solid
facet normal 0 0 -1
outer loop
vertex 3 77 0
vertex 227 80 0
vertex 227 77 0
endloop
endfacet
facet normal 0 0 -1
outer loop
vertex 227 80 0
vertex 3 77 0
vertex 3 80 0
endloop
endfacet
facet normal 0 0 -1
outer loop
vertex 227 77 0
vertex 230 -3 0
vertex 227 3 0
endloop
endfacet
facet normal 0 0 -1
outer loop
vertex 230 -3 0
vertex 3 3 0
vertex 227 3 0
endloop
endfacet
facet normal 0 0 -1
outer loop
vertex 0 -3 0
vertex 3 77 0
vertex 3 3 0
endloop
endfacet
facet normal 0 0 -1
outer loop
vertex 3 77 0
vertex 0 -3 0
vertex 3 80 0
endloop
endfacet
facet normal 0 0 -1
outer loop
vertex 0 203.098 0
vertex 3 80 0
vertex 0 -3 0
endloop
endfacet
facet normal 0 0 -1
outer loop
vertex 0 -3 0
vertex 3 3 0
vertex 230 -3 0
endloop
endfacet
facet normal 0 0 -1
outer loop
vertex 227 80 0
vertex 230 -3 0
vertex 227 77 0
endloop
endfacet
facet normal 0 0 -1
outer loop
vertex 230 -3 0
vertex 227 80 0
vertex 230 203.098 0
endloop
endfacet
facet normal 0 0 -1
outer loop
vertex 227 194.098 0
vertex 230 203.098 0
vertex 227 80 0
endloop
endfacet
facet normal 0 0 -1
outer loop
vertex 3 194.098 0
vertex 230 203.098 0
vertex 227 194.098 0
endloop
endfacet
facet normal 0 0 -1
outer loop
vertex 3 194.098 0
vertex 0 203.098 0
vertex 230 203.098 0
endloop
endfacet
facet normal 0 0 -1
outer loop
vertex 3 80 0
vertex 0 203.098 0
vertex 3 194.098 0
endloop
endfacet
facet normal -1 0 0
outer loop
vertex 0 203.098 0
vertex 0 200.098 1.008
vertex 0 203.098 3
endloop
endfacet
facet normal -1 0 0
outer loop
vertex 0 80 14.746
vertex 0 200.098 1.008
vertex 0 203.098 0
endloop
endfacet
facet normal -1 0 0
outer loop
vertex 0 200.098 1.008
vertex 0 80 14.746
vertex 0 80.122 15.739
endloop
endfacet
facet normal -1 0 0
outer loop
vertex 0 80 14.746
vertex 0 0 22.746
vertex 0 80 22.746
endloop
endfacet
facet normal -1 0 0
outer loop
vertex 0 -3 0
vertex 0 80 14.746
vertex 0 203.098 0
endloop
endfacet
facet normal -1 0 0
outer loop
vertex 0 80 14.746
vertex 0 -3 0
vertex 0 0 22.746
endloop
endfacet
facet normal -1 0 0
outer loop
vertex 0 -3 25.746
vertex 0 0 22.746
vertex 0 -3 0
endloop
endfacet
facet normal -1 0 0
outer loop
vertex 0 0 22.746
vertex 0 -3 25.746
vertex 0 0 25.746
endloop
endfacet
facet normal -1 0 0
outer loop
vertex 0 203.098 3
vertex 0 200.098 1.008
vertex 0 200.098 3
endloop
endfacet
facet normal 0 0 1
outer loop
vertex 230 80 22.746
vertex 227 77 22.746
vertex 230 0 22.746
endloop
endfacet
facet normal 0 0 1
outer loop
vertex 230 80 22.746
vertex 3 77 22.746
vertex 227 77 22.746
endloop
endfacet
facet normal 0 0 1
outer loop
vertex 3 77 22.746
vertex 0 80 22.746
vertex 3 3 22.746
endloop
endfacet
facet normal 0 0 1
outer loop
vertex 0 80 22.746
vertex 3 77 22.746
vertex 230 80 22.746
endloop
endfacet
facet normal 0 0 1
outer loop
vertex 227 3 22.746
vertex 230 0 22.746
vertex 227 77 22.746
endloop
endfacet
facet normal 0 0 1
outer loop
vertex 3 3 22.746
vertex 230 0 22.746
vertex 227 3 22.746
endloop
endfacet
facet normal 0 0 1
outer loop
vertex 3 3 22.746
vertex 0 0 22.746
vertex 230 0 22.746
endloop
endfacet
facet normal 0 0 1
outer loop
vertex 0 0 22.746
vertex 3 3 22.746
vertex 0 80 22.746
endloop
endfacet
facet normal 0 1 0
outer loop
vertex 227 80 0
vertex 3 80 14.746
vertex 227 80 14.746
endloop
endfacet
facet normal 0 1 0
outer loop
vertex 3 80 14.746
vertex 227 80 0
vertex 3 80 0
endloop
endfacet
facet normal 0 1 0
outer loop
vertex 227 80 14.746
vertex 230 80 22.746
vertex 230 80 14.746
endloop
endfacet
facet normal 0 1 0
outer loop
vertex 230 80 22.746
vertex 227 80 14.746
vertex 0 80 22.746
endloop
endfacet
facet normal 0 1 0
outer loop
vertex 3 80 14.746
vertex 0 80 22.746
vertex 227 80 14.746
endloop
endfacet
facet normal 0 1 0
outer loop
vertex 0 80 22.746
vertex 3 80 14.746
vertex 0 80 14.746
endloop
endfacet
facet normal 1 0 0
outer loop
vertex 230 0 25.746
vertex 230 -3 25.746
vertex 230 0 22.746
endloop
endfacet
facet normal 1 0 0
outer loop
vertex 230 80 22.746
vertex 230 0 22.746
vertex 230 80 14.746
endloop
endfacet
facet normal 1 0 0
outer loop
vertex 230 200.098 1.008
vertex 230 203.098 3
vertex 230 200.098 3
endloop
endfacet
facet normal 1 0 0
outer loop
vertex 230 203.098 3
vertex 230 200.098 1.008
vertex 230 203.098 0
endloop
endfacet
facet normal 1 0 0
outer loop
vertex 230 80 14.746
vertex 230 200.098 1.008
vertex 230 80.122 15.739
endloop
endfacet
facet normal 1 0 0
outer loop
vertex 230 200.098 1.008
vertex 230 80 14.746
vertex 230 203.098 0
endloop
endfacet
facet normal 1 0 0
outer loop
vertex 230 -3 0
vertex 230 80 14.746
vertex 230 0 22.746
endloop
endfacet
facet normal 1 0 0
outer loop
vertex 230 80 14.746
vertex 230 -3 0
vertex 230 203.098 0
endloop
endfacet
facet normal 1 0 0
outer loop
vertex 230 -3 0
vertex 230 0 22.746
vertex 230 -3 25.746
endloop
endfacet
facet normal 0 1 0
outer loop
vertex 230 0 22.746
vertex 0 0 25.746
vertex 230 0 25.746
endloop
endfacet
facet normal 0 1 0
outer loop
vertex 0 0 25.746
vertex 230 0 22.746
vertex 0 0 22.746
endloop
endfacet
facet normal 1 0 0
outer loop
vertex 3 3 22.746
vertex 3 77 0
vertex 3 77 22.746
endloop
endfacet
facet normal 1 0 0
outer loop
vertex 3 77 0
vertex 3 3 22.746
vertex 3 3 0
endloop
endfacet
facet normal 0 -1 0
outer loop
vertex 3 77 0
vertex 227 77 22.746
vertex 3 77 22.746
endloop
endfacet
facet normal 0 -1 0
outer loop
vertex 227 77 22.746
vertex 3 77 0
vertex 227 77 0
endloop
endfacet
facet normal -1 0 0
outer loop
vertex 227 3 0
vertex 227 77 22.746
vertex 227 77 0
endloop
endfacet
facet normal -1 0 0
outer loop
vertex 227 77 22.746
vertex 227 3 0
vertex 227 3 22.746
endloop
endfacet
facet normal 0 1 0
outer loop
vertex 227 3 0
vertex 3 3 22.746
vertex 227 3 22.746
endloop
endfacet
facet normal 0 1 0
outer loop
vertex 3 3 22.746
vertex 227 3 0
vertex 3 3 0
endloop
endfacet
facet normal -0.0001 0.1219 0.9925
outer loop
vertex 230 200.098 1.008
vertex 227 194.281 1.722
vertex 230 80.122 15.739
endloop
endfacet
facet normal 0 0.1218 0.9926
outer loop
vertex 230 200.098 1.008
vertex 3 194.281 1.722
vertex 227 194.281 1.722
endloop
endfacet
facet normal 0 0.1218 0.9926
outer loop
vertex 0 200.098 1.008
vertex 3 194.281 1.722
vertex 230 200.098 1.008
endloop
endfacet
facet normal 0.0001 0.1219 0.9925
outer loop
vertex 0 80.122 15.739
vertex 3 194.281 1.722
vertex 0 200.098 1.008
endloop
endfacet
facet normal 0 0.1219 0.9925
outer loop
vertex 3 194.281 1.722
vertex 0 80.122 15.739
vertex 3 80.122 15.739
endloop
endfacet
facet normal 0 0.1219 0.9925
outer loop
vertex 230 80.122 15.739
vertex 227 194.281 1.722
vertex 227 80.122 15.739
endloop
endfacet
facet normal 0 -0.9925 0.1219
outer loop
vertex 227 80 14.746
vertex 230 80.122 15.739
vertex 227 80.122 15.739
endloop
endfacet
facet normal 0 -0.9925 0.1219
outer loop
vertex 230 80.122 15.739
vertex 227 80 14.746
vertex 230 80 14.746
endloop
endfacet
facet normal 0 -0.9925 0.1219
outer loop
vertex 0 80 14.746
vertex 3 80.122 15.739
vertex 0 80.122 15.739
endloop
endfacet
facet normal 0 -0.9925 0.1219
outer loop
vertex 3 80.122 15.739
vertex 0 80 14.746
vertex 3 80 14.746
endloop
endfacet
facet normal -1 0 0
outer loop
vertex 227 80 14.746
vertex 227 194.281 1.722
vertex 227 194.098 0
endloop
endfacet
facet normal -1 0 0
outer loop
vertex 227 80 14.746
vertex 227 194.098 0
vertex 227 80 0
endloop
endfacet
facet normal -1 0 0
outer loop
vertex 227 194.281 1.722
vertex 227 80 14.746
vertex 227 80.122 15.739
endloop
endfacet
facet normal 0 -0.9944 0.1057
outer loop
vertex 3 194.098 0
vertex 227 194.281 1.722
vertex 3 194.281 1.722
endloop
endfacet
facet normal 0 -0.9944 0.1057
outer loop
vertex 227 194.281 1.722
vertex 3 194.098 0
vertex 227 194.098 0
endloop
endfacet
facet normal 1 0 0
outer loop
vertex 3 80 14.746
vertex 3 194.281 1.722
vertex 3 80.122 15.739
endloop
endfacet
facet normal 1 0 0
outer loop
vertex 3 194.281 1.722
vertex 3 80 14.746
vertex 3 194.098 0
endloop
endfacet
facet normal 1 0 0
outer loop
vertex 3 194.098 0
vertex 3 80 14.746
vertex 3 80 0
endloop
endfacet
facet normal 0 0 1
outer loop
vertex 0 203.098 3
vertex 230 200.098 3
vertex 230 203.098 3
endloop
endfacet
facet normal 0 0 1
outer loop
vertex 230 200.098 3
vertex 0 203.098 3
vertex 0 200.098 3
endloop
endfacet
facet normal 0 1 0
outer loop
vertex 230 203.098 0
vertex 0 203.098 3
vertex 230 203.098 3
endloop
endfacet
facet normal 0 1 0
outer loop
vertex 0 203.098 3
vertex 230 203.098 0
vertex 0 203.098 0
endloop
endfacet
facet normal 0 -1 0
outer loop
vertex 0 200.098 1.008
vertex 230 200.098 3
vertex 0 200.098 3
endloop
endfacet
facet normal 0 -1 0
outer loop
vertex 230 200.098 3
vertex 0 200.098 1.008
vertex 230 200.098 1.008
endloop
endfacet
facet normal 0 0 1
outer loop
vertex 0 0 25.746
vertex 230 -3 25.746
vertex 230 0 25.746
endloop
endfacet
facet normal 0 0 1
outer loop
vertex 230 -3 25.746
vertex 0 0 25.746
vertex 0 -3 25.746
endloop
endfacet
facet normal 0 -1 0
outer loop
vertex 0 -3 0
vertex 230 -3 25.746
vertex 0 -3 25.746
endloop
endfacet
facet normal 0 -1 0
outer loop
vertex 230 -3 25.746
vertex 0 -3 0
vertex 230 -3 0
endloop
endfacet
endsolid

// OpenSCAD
// object constraints
keyboard_depth = 112;
keyboard_aluminum_case_depth = 9;
palmrest_depth = 80;

// preferences
core_width = 230;
forward_pitch_degrees = 7 ;
palmrest_elevation = 7;
wall_width = 3;

// calculable
ramp_slope_depth = keyboard_depth + keyboard_aluminum_case_depth;
ramp_height = sin(forward_pitch_degrees) * ramp_slope_depth;
ramp_base_depth = cos(forward_pitch_degrees) * ramp_slope_depth;
stage_depth = palmrest_depth;

// palm rest
palmrest_height = ramp_height + palmrest_elevation + 1;

difference() {
    linear_extrude(height = palmrest_height) {
        square([core_width, stage_depth]);
    }

    translate([wall_width, wall_width, 0]) 
    linear_extrude(height = palmrest_height) {
        square([core_width - wall_width * 2, stage_depth - wall_width * 2]);
    }
}

echo(ramp_height);

// keyboard ramp
difference() {
translate([0,stage_depth,0]) {
    hull() {
        // keyboard ramp base
        linear_extrude(height = 1) 
        square([core_width, ramp_base_depth]);

        // keyboard ramp incline
        translate([0,0,ramp_height]) {
            rotate([-forward_pitch_degrees,0,0]) {
                linear_extrude(height = 1) 
                square([core_width, ramp_slope_depth]);
            }
        }
    }
}

translate([wall_width,stage_depth,0]) {
    hull() {
        // keyboard ramp base
        linear_extrude(height = 1) 
        square([core_width - wall_width * 2, ramp_base_depth - wall_width * 2]);

        // keyboard ramp incline
        translate([0,0,ramp_height]) {
            rotate([-forward_pitch_degrees,0,0]) {
                linear_extrude(height = 2) 
                square([core_width - wall_width * 2, ramp_slope_depth - wall_width * 2]);
            }
        }
    }
}
}

//lips
lip_height = 3;
lip_depth = 3;

// ramp lip
translate([0, stage_depth + ramp_base_depth]) {
    linear_extrude(height = lip_height) {
        square([core_width,lip_depth]);
    }
}

// palm rest lip
translate([0, -lip_depth, 0]) 
linear_extrude(height = palmrest_height + lip_height) 
square([core_width, lip_depth]);
